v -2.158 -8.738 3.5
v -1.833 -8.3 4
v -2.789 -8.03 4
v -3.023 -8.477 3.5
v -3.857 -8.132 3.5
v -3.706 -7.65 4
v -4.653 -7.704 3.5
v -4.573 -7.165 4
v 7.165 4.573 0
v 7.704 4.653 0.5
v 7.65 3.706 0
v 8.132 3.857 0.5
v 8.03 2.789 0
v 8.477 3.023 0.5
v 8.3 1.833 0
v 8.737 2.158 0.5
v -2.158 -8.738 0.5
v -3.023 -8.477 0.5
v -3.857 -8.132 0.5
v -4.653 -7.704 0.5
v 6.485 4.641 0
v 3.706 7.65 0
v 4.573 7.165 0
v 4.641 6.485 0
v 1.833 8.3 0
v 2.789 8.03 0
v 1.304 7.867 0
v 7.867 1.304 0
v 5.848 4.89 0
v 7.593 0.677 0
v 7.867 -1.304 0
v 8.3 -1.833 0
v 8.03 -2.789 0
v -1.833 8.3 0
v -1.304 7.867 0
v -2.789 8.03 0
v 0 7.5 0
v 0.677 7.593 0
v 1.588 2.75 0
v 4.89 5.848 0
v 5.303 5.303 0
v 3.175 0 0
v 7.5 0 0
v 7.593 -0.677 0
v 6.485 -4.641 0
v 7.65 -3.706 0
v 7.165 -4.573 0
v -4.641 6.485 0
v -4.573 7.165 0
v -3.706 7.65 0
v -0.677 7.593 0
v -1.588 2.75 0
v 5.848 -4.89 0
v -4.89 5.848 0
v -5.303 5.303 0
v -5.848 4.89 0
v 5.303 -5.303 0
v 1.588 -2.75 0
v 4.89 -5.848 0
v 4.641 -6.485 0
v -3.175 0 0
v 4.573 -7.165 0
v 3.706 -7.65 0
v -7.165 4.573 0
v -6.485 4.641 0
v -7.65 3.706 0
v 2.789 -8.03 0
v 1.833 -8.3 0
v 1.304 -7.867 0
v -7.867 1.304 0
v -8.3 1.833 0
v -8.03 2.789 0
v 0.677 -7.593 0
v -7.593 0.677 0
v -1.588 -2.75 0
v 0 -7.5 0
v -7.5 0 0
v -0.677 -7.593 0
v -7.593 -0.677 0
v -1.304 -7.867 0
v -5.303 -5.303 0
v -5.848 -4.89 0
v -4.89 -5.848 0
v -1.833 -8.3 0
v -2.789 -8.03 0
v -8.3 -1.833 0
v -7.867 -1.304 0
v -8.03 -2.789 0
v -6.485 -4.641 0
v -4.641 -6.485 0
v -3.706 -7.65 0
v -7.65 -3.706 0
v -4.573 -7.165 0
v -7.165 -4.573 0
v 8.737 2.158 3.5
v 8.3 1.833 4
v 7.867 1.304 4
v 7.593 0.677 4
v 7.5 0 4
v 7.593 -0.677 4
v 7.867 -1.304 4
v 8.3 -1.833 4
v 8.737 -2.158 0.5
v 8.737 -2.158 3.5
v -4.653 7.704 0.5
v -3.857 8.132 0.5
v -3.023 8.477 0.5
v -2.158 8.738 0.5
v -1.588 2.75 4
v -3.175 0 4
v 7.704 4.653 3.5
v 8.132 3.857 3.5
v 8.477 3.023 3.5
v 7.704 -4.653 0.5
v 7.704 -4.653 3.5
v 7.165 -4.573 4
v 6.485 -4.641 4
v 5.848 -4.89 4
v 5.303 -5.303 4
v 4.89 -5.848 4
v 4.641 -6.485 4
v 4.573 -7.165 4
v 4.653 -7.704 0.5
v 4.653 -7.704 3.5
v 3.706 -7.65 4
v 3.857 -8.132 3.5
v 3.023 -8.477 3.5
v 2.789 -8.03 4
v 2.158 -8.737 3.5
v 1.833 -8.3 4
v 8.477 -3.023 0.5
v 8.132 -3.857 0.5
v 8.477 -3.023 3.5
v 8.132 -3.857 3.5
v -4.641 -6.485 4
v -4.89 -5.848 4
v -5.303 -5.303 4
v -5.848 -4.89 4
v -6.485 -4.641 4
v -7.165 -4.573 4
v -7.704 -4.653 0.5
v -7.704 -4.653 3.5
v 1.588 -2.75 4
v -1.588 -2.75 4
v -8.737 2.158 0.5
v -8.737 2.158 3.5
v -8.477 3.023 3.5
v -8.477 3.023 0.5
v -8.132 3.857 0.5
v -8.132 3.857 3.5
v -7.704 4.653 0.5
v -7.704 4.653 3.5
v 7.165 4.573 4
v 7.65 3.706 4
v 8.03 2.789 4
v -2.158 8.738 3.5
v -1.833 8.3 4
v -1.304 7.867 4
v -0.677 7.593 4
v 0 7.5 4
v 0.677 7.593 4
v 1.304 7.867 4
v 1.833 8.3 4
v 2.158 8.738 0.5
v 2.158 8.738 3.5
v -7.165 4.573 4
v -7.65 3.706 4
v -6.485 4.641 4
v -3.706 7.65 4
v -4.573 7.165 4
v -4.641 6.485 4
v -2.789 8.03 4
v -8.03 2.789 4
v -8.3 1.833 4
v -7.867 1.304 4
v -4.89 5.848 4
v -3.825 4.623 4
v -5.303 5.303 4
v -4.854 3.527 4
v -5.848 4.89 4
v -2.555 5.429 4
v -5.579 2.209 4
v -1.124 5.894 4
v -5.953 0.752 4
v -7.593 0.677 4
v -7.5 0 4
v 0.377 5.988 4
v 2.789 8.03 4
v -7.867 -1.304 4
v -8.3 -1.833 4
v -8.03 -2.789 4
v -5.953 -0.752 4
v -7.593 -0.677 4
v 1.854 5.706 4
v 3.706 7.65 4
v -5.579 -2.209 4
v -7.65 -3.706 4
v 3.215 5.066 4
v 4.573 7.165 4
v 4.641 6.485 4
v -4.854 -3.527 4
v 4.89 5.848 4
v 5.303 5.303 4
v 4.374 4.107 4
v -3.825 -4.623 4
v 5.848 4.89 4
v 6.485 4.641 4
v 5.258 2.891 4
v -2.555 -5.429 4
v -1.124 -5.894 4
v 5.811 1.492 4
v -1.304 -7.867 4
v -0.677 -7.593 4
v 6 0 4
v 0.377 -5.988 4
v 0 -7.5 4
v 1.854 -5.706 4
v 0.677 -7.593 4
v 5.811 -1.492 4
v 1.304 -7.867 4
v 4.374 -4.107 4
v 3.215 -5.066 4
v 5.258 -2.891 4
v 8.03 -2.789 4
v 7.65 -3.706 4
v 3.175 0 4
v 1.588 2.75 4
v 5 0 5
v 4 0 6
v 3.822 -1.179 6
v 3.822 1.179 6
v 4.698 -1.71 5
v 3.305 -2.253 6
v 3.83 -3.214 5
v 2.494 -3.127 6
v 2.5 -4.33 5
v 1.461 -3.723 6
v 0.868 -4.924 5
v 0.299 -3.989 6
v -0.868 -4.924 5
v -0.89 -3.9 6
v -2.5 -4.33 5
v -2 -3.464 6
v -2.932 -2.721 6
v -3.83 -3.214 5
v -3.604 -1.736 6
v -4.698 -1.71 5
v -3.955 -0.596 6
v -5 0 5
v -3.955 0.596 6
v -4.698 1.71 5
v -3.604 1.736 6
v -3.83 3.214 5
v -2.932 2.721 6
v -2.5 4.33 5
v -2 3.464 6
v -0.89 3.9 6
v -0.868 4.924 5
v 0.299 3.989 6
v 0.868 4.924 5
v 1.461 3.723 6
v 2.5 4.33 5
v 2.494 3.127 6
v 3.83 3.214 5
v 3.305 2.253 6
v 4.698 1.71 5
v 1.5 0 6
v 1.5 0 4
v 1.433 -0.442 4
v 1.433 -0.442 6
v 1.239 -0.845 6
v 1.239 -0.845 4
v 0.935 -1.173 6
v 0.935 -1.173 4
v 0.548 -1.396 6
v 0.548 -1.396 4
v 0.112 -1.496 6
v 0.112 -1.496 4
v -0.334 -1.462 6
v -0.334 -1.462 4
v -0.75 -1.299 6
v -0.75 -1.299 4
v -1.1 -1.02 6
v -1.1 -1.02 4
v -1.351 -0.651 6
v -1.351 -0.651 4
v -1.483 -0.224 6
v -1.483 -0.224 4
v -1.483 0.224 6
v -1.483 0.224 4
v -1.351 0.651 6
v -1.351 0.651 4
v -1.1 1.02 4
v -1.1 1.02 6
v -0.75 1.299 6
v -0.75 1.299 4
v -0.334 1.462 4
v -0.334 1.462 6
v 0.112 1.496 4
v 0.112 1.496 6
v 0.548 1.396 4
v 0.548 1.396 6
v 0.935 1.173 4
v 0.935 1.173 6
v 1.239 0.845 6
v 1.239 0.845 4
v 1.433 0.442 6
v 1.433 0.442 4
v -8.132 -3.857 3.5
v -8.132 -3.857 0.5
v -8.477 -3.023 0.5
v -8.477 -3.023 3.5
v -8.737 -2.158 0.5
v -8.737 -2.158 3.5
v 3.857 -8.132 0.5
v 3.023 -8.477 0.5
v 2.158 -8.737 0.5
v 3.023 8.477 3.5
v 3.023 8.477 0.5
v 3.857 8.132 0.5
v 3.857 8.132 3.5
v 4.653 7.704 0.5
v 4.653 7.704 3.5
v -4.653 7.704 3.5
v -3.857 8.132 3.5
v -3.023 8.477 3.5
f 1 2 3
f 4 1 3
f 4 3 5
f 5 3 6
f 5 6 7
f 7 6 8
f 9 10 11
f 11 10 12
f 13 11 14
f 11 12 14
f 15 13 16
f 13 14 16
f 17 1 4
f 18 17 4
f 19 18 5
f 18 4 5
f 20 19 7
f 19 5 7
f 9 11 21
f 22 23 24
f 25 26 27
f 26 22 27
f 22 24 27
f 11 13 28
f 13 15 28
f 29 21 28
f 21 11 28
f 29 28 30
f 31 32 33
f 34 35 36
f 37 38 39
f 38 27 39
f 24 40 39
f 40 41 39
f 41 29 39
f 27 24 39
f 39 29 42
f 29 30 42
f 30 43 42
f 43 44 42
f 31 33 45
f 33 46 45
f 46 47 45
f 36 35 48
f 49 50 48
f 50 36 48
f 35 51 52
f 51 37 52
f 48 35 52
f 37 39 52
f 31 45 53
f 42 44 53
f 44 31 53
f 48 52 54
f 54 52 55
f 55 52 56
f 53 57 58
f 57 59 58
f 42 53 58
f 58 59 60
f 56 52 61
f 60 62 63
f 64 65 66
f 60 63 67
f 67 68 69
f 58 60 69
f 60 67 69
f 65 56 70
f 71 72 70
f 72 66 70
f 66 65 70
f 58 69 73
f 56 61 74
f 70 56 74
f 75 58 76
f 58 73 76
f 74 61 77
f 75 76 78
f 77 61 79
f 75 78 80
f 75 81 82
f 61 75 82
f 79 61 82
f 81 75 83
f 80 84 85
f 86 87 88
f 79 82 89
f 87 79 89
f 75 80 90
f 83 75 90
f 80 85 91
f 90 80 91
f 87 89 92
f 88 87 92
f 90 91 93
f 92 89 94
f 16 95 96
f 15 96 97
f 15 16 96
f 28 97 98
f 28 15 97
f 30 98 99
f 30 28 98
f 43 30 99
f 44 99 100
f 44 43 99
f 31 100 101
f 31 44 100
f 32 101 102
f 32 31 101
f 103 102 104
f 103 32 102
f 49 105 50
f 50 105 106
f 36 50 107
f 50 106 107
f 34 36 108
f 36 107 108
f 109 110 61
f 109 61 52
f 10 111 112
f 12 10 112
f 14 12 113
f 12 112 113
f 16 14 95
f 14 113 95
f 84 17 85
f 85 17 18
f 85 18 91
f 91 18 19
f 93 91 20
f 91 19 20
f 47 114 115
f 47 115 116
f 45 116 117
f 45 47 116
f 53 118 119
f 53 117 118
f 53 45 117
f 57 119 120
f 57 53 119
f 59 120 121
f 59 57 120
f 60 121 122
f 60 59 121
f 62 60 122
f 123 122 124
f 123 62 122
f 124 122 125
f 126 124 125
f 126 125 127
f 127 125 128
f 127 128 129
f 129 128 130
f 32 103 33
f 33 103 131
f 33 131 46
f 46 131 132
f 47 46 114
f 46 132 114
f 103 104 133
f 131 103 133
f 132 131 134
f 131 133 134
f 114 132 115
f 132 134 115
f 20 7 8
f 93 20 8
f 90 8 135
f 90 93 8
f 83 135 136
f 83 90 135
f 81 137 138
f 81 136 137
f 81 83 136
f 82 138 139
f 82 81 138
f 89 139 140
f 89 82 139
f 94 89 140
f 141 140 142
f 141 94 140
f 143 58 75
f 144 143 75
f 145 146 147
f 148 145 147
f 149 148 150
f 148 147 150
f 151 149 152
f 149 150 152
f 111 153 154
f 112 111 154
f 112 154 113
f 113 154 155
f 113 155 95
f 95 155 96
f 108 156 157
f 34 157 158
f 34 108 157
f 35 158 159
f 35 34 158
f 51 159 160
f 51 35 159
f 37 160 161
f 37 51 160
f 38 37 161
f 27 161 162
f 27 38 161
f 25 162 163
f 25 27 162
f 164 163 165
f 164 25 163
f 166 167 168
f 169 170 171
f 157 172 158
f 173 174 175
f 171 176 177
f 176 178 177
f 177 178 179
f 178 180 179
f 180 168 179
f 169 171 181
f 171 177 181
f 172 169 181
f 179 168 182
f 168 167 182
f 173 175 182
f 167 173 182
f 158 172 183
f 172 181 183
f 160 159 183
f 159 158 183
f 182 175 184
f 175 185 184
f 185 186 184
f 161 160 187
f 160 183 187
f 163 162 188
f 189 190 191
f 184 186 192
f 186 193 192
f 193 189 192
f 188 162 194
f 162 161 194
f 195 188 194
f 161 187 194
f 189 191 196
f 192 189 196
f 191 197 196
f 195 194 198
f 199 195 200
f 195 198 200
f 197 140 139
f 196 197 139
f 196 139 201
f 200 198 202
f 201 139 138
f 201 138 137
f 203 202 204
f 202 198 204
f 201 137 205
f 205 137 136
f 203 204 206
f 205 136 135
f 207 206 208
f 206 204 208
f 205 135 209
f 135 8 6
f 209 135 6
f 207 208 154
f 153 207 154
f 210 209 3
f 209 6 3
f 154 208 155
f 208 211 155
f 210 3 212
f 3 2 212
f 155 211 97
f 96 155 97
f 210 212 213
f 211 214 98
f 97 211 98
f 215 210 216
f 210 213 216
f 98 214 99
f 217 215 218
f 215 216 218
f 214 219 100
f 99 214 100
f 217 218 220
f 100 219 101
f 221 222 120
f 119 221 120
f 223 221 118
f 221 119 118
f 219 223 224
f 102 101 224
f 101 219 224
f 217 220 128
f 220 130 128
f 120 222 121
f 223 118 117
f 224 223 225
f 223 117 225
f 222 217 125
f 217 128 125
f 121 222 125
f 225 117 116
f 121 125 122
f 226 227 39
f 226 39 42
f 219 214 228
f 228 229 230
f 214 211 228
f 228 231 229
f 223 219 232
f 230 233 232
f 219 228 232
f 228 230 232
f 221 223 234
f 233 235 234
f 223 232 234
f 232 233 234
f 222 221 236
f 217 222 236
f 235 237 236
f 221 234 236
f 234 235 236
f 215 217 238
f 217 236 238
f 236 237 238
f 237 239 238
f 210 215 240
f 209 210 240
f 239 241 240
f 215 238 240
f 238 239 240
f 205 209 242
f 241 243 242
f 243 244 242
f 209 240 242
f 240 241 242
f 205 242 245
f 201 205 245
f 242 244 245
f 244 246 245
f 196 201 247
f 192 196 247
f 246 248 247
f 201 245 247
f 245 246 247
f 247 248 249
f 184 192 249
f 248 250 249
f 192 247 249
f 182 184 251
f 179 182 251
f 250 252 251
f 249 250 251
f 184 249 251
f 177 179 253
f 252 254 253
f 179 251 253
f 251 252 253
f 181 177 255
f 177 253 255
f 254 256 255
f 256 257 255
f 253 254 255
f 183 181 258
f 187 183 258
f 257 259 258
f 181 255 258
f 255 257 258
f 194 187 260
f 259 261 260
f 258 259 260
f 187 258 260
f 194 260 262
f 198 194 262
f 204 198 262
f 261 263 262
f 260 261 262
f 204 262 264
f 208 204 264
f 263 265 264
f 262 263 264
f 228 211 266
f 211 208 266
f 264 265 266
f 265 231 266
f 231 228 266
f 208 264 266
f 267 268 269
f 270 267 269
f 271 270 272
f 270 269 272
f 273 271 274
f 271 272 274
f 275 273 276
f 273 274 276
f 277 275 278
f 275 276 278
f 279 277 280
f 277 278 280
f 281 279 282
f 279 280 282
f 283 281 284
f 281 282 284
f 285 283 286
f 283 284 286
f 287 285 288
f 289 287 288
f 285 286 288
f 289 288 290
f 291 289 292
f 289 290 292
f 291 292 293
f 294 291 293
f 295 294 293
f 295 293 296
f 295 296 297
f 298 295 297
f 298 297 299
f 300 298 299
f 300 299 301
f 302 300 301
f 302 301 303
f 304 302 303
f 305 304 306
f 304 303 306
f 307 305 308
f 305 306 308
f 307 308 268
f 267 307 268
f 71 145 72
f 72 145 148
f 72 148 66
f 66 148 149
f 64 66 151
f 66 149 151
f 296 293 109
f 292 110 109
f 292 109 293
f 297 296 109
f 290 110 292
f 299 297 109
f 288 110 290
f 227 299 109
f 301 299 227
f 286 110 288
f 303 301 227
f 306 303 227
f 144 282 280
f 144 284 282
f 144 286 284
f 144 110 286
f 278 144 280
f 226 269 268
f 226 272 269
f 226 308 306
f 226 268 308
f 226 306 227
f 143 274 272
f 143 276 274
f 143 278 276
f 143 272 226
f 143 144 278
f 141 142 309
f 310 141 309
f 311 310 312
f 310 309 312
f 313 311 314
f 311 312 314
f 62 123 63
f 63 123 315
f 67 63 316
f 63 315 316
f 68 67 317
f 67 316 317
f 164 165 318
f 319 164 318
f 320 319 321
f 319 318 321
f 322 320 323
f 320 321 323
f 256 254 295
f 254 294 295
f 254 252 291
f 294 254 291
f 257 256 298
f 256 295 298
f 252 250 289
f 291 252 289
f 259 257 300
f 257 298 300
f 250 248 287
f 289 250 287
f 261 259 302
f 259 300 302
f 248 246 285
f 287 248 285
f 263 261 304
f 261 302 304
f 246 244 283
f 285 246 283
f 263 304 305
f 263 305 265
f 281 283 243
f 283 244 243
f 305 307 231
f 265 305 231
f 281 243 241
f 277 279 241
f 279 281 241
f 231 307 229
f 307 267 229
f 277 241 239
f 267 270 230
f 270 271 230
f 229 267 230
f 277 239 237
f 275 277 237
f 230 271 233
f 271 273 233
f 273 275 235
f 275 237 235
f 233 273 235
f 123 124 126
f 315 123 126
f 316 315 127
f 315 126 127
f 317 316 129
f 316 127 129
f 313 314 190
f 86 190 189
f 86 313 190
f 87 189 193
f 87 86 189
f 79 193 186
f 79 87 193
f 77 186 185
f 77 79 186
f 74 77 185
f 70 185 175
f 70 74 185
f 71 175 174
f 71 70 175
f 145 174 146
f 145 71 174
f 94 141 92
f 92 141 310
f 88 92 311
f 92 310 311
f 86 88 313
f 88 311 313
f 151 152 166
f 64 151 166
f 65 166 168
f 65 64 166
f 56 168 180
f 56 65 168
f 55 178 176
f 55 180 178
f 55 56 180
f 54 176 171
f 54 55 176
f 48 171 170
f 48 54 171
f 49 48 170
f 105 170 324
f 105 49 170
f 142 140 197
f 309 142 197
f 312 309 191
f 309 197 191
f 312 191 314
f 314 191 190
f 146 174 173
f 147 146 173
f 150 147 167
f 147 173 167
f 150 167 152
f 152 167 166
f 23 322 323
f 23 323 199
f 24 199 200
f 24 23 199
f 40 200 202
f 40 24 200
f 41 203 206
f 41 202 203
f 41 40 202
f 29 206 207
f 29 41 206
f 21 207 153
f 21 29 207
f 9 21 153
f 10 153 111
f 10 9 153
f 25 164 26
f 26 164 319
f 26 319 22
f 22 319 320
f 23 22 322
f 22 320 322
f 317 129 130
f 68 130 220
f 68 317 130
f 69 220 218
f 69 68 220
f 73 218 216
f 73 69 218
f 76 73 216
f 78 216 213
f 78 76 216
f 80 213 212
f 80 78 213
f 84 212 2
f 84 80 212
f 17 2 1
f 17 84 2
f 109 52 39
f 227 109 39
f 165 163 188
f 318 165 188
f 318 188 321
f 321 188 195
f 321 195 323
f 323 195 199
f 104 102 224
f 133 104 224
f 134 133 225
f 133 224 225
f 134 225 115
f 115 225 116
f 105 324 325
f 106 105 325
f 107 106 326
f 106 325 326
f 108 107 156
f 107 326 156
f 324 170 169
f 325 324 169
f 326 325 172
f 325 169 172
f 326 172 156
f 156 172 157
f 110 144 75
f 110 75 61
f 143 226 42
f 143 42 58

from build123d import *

# Parameters (mm, degrees)
F3_SIZE  = 0.5
F2_R     = 2.5
F4_DEPTH = 6
F5_COUNT = 8
F8_DEPTH = 4


with BuildPart() as f1:
    # F0 (on Front) → F1 (revolve)
    with BuildSketch(Plane.XZ):
        Polygon((1.5, 6), (1.5, 0), (9, 0), (9, 4), (6, 4), (4, 6), align=None)
    revolve(axis=Axis((0, 0, 3.871229), (0, 0, -1)))

    # F3
    f3_edges = [f1.edges().sort_by_distance(p)[0] for p in [
        (-9, 0, 4),
        (-9, 0, 0),
    ]]
    chamfer(f3_edges, length=F3_SIZE)


with BuildPart() as f4:
    # F2 (on Top) → F4 (new body, through all)
    with BuildSketch(Plane.XY):
        with Locations((0, 10)):
            Circle(F2_R)
    extrude(amount=F4_DEPTH)


with BuildPart() as f5_1:
    # F5: instance of F4
    add(f4.part.rotate(Axis((0, 0, 6), (0, 0, -1)), 1 * 360 / F5_COUNT))


with BuildPart() as f5_2:
    # F5: instance of F4
    add(f4.part.rotate(Axis((0, 0, 6), (0, 0, -1)), 2 * 360 / F5_COUNT))


with BuildPart() as f5_3:
    # F5: instance of F4
    add(f4.part.rotate(Axis((0, 0, 6), (0, 0, -1)), 3 * 360 / F5_COUNT))


with BuildPart() as f5_4:
    # F5: instance of F4
    add(f4.part.rotate(Axis((0, 0, 6), (0, 0, -1)), 4 * 360 / F5_COUNT))


with BuildPart() as f5_5:
    # F5: instance of F4
    add(f4.part.rotate(Axis((0, 0, 6), (0, 0, -1)), 5 * 360 / F5_COUNT))


with BuildPart() as f5_6:
    # F5: instance of F4
    add(f4.part.rotate(Axis((0, 0, 6), (0, 0, -1)), 6 * 360 / F5_COUNT))


with BuildPart() as f5_7:
    # F5: instance of F4
    add(f4.part.rotate(Axis((0, 0, 6), (0, 0, -1)), 7 * 360 / F5_COUNT))


with BuildPart() as f1_1:
    add(f1.part)

    # F6: cut F4, F5_1, F5_2, F5_3, F5_4, F5_5, F5_6, F5_7
    add(f4.part, mode=Mode.SUBTRACT)
    add(f5_1.part, mode=Mode.SUBTRACT)
    add(f5_2.part, mode=Mode.SUBTRACT)
    add(f5_3.part, mode=Mode.SUBTRACT)
    add(f5_4.part, mode=Mode.SUBTRACT)
    add(f5_5.part, mode=Mode.SUBTRACT)
    add(f5_6.part, mode=Mode.SUBTRACT)
    add(f5_7.part, mode=Mode.SUBTRACT)

    # F7 (on face) → F8 (cut)
    with BuildSketch(Plane(origin=(0, 0, 0), x_dir=(1, 0, 0), z_dir=(0, 0, -1))):
        Polygon((-1.587713, 2.75), (-3.175426, 0), (-1.587713, -2.75), (1.587713, -2.75), (3.175426, 0), (1.587713, 2.75), align=None)
    extrude(amount=-F8_DEPTH, mode=Mode.SUBTRACT)


solid = f1_1.part
